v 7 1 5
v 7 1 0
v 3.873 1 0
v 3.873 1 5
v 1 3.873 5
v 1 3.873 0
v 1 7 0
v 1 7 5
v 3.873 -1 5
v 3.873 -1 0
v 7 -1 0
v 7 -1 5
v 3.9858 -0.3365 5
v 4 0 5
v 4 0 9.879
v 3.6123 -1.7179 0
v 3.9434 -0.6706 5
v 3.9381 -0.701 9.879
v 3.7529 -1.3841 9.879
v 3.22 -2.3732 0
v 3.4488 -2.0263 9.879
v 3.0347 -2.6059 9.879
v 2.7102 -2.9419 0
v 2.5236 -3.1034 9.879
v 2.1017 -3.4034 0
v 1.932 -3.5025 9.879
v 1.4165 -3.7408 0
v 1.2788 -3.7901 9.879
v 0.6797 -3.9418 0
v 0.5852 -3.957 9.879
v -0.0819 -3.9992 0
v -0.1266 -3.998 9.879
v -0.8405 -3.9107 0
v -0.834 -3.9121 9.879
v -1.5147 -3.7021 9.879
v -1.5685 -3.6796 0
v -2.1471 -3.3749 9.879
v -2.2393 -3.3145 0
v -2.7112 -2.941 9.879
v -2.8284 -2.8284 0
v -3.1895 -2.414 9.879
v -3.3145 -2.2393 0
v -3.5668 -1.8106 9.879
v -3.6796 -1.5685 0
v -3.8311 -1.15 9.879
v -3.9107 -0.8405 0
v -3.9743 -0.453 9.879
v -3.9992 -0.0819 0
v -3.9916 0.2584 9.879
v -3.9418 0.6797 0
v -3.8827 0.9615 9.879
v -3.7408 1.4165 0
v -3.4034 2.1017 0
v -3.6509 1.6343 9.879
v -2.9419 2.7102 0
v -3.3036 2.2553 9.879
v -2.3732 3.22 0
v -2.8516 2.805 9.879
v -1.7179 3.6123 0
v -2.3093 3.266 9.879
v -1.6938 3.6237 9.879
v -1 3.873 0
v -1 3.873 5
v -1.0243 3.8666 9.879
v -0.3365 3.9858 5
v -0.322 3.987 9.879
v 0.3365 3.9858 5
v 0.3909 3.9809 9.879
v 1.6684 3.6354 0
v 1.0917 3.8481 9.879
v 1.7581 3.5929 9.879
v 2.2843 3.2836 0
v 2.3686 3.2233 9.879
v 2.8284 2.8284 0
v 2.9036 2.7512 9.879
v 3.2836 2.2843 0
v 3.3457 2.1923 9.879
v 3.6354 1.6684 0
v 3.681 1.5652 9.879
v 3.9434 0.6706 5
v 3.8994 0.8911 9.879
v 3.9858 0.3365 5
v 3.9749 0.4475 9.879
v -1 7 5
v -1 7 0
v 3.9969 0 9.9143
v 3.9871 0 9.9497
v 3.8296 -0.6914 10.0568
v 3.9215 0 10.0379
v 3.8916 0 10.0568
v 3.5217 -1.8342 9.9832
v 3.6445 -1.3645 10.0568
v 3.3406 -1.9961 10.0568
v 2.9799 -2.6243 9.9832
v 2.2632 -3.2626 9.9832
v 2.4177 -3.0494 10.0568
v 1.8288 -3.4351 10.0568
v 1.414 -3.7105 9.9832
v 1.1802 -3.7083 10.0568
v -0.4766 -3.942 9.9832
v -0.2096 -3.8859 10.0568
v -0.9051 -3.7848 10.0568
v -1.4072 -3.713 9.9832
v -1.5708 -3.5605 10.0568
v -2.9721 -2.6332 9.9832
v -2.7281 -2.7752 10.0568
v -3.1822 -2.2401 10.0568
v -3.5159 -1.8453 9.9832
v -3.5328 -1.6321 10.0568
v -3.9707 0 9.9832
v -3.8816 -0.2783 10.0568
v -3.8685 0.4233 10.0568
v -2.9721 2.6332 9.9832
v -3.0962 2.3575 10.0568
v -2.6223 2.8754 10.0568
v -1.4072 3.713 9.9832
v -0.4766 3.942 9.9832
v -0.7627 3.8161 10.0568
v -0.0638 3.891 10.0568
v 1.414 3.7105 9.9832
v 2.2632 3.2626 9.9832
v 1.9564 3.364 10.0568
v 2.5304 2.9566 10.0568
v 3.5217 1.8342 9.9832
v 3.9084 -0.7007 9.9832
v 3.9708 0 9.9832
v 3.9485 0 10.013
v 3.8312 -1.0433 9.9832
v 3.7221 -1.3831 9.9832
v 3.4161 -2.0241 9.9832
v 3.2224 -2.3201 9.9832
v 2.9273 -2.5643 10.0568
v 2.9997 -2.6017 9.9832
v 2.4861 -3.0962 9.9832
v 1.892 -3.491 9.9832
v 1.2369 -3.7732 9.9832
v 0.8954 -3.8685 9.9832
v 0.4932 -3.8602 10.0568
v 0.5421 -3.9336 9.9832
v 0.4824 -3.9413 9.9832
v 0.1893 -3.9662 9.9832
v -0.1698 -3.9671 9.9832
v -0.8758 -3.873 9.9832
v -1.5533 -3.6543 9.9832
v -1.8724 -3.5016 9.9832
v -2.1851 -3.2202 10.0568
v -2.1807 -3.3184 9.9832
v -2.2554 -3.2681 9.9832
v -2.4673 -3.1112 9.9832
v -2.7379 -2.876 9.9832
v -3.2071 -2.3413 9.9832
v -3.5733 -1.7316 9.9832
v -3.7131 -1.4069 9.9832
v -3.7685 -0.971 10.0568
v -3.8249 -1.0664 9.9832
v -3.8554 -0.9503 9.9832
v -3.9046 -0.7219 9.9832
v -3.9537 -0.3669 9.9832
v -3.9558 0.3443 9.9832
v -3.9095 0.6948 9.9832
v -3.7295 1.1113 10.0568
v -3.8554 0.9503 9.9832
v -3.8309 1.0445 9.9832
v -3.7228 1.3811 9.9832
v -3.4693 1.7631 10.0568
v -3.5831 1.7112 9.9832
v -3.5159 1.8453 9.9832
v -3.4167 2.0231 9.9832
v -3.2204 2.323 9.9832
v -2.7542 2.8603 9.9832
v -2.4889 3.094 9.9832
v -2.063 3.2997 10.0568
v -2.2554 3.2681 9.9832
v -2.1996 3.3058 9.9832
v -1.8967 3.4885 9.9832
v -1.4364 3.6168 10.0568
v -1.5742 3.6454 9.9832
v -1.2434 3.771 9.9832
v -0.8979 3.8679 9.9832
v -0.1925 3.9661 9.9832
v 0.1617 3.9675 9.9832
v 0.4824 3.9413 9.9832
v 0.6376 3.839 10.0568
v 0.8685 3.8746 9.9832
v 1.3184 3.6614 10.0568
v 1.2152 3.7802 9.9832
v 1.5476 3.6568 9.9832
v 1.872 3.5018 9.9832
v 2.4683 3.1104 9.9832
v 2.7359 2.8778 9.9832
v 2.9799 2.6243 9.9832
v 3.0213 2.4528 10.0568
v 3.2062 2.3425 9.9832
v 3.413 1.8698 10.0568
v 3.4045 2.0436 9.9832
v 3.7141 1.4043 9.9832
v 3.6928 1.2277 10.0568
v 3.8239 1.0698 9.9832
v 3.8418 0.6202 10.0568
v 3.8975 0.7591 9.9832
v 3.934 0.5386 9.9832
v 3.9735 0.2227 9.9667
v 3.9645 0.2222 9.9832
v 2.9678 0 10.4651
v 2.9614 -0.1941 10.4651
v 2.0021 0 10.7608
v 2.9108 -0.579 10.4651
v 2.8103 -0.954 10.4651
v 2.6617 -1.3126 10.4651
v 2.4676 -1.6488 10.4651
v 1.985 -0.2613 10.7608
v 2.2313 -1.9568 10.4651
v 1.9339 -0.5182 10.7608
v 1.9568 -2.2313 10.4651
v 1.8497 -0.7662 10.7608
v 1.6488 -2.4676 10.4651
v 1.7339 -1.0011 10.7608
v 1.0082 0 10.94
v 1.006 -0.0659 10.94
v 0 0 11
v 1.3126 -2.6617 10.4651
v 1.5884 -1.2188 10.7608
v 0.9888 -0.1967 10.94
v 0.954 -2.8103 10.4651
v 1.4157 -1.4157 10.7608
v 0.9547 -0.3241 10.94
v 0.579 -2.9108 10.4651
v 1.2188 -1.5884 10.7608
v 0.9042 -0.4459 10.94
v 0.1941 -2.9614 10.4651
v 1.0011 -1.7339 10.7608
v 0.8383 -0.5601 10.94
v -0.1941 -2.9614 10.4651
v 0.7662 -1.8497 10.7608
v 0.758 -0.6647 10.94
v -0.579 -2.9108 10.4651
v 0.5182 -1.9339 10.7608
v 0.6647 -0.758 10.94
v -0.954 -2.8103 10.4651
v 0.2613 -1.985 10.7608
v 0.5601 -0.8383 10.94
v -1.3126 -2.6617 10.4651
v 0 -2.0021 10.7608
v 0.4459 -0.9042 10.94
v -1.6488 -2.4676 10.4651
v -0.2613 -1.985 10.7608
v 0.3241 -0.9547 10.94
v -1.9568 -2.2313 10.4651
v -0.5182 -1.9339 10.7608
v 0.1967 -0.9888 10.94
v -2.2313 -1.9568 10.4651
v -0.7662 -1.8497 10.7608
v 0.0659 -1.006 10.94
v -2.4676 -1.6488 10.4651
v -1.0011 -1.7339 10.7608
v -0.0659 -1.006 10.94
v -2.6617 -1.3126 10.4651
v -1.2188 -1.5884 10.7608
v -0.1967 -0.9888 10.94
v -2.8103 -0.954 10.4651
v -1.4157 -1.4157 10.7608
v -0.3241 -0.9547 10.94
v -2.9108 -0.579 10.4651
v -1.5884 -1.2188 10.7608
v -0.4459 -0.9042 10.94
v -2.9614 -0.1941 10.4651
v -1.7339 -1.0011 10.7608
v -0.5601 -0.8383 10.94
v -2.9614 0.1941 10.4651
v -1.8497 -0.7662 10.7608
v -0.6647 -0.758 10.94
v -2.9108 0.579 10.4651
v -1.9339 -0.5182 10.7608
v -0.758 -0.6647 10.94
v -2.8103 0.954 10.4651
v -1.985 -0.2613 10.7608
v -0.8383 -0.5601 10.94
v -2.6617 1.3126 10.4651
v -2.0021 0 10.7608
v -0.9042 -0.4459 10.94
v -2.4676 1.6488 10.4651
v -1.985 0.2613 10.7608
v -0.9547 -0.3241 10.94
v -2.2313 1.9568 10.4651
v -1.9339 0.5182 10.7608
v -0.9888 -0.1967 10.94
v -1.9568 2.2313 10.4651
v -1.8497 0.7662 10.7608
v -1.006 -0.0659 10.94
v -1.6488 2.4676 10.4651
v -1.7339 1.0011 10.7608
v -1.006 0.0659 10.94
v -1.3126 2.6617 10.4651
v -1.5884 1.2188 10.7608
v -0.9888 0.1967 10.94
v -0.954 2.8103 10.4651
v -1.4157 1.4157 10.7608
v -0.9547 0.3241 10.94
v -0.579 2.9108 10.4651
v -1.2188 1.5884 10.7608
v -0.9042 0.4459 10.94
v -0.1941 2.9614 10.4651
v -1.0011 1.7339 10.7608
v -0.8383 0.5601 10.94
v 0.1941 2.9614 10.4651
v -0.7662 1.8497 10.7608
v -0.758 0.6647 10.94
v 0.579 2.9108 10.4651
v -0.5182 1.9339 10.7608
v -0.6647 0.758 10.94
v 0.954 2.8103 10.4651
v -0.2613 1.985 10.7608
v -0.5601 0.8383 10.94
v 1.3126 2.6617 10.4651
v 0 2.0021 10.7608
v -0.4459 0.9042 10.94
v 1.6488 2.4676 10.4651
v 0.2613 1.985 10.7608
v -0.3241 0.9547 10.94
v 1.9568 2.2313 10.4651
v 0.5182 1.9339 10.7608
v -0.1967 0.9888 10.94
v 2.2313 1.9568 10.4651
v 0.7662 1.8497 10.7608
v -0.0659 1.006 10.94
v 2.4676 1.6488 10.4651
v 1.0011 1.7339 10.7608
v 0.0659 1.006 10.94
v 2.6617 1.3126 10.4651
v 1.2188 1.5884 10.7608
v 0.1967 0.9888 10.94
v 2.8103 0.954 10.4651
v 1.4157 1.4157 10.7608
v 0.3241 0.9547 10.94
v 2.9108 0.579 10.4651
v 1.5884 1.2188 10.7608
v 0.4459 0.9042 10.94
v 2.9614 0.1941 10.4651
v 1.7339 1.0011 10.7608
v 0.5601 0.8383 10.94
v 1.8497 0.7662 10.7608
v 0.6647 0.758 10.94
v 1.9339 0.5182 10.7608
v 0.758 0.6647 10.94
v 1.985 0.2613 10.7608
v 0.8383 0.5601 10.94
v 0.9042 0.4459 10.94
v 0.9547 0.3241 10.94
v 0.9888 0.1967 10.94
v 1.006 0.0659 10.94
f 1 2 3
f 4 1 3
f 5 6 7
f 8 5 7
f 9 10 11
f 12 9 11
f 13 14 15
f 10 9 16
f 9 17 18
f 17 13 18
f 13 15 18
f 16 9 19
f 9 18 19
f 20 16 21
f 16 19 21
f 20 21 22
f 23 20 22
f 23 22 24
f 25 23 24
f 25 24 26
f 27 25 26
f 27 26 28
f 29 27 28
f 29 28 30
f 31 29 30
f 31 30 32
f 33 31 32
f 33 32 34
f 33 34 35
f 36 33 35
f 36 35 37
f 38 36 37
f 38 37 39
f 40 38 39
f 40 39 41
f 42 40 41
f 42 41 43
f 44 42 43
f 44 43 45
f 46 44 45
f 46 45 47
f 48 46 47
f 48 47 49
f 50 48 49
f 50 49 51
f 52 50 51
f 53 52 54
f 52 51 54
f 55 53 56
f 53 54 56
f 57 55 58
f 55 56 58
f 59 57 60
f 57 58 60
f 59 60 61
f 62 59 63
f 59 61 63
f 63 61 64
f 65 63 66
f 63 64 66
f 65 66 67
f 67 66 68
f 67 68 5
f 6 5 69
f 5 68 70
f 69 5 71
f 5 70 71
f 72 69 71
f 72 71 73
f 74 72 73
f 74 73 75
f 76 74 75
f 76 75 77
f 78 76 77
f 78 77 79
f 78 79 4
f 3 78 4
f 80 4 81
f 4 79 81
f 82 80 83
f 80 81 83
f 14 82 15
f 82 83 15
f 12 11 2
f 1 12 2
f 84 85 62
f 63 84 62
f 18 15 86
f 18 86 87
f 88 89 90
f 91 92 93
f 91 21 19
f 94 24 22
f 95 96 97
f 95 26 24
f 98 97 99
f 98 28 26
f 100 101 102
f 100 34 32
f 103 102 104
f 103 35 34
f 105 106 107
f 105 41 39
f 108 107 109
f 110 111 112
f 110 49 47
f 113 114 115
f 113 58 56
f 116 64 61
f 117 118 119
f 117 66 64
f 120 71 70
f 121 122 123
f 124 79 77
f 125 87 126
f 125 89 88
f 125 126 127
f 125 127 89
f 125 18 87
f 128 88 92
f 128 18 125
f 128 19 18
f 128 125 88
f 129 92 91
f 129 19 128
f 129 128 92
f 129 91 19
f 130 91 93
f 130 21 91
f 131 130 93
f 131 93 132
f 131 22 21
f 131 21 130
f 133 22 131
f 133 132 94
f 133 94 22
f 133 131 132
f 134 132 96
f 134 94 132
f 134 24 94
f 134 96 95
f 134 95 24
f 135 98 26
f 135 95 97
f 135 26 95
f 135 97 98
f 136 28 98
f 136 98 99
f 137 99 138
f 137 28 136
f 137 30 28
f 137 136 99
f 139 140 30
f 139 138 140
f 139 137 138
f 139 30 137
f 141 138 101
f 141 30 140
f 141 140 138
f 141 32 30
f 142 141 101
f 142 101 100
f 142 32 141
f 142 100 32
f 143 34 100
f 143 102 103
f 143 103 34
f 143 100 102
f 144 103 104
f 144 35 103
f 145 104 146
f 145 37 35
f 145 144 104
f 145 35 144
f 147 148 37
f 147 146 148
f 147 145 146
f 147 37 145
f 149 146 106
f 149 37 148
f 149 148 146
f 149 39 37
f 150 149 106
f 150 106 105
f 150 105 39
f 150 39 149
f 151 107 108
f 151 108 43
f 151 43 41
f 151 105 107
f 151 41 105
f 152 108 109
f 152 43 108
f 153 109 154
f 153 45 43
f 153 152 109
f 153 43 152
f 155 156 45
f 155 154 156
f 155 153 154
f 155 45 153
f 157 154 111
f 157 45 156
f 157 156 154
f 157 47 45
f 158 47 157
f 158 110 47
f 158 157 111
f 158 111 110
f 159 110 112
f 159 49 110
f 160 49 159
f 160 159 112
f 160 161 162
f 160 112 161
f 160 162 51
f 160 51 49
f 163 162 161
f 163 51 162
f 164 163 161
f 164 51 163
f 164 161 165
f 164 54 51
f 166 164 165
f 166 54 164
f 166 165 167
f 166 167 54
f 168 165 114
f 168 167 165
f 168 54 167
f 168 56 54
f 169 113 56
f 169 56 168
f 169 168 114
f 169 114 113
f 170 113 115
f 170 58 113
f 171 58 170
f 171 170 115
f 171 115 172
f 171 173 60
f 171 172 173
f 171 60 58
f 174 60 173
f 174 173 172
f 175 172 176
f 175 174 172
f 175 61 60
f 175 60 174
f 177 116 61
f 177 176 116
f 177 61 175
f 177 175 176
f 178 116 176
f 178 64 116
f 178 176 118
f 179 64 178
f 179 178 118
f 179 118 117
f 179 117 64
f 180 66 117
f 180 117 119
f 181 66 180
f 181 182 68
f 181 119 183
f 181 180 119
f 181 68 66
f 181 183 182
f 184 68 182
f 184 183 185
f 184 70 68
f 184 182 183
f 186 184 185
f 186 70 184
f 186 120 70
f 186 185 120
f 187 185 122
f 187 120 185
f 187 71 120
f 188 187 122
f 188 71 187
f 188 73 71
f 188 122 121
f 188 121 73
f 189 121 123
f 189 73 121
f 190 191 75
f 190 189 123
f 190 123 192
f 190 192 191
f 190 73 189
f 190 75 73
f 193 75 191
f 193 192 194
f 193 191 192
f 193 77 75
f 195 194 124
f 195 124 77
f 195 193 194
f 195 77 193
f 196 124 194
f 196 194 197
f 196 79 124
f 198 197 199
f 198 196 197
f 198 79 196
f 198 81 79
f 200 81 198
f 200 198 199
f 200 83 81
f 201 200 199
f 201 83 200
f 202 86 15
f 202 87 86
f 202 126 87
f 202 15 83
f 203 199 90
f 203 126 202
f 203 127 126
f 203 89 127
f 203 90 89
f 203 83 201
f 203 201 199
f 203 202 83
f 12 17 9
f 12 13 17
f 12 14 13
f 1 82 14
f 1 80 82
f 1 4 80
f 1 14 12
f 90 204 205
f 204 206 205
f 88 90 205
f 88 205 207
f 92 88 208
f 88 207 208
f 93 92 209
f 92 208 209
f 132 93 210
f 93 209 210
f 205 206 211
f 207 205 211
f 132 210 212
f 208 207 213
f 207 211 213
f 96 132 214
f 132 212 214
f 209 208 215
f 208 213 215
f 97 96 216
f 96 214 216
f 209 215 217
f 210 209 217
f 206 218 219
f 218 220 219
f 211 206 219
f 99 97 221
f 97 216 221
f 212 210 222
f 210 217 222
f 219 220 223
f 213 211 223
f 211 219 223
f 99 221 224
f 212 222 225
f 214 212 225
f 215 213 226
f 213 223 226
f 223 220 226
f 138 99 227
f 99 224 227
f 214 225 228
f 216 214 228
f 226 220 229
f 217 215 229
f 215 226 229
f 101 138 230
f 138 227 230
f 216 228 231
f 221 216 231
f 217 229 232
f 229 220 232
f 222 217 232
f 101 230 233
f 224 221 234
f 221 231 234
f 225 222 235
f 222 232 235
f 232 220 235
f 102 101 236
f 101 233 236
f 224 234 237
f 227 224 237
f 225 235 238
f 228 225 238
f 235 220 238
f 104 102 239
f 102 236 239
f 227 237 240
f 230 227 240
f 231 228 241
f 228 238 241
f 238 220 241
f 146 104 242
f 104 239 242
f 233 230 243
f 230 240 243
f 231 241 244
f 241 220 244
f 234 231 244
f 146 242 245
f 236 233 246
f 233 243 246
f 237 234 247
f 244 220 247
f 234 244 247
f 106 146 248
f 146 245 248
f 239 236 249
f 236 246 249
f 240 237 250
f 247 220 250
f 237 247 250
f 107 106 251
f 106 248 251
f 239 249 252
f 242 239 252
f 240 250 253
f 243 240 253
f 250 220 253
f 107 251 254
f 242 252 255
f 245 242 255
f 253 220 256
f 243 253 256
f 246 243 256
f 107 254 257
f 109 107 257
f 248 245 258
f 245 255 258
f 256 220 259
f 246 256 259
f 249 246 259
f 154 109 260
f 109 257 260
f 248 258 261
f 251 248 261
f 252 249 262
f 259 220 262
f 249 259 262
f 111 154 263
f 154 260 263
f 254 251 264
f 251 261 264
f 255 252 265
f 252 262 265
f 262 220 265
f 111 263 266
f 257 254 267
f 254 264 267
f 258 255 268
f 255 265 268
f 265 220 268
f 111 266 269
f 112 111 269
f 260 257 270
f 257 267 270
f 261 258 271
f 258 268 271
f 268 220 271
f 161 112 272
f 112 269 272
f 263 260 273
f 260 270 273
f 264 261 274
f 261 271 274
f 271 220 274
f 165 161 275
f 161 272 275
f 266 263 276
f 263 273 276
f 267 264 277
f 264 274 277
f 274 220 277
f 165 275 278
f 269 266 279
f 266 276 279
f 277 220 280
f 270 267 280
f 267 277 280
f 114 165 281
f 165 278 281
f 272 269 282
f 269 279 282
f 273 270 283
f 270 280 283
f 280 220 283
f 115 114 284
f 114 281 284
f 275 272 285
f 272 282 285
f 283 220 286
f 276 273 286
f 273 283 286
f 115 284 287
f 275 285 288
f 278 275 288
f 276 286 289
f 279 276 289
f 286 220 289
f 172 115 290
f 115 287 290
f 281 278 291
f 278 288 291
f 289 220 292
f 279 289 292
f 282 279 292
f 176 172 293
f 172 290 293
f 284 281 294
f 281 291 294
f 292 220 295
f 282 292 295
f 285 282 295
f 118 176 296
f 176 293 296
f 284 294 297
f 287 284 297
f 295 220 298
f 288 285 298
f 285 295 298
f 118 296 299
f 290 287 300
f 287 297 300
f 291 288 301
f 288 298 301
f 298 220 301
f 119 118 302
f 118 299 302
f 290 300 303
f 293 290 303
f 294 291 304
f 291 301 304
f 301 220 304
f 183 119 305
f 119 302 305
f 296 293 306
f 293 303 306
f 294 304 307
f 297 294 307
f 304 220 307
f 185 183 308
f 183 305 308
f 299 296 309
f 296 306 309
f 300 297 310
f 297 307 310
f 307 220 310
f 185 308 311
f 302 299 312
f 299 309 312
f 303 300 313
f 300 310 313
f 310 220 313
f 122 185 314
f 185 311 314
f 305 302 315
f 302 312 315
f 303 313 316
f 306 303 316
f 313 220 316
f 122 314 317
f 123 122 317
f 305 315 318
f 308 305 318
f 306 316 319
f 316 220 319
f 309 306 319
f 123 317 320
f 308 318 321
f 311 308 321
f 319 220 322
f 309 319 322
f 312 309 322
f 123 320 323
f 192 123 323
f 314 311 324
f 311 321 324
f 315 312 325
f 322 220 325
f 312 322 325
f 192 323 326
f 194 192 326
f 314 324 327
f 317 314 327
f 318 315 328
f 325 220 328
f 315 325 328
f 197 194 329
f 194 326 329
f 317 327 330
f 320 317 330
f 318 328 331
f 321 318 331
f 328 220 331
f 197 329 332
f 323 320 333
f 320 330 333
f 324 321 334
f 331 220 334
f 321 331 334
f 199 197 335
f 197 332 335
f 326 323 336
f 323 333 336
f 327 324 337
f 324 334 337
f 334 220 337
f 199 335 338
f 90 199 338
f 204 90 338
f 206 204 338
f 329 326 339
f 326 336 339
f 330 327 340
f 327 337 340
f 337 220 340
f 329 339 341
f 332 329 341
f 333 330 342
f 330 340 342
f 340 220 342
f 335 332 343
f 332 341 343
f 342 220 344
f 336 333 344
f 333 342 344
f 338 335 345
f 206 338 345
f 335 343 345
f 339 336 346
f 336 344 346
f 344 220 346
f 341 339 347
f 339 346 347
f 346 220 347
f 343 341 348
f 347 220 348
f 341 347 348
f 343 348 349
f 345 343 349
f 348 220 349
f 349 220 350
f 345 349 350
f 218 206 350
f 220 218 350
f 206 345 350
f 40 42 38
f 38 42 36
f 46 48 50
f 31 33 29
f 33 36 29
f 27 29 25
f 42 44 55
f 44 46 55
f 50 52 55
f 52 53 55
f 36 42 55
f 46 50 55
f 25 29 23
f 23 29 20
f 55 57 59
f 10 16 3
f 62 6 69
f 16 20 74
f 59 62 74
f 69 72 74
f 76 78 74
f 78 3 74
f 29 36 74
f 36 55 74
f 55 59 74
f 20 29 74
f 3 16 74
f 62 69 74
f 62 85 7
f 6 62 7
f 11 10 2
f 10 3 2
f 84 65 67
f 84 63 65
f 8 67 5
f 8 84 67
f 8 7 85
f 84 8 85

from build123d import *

# Parameters (mm, degrees)
F2_R     = 0.2
F4_DEPTH = 5


with BuildPart() as f1:
    # F0 (on Front) → F1 (revolve)
    with BuildSketch(Plane.XZ):
        with BuildLine():
            Line((0, 9.25), (0, 0))
            Line((0, 0), (4, 0))
            Line((4, 0), (4, 10))
            Line((4, 10), (3.75, 10))
            ThreePointArc((3.75, 10), (1.9121323176, 9.439338412), (0, 9.25))
        make_face()
        with BuildLine():
            Line((0, 10), (0, 9.25))
            ThreePointArc((0, 9.25), (1.9121323176, 9.439338412), (3.75, 10))
            Line((3.75, 10), (0, 10))
        make_face()
        with BuildLine():
            Line((3.75, 10), (4, 10))
            ThreePointArc((4, 10), (2.0615528128, 10.7462112512), (0, 11))
            Line((0, 11), (0, 10))
            Line((0, 10), (3.75, 10))
        make_face()
    revolve(axis=Axis((0, 0, 5), (0, 0, -1)))

    # F2
    f2_edges = [f1.edges().sort_by_distance(p)[0] for p in [
        (-4, 0, 10),
    ]]
    fillet(f2_edges, radius=F2_R)

    # F3 (on Top) → F4 (join)
    with BuildSketch(Plane.XY):
        Polygon((-1, 7), (-1, 0), (0, 0), (0, 1), (1, 1), (1, 7), align=None)
        Polygon((1, 0), (0, 0), (0, -1), (7, -1), (7, 1), (1, 1), align=None)
    extrude(amount=F4_DEPTH)


solid = f1.part
